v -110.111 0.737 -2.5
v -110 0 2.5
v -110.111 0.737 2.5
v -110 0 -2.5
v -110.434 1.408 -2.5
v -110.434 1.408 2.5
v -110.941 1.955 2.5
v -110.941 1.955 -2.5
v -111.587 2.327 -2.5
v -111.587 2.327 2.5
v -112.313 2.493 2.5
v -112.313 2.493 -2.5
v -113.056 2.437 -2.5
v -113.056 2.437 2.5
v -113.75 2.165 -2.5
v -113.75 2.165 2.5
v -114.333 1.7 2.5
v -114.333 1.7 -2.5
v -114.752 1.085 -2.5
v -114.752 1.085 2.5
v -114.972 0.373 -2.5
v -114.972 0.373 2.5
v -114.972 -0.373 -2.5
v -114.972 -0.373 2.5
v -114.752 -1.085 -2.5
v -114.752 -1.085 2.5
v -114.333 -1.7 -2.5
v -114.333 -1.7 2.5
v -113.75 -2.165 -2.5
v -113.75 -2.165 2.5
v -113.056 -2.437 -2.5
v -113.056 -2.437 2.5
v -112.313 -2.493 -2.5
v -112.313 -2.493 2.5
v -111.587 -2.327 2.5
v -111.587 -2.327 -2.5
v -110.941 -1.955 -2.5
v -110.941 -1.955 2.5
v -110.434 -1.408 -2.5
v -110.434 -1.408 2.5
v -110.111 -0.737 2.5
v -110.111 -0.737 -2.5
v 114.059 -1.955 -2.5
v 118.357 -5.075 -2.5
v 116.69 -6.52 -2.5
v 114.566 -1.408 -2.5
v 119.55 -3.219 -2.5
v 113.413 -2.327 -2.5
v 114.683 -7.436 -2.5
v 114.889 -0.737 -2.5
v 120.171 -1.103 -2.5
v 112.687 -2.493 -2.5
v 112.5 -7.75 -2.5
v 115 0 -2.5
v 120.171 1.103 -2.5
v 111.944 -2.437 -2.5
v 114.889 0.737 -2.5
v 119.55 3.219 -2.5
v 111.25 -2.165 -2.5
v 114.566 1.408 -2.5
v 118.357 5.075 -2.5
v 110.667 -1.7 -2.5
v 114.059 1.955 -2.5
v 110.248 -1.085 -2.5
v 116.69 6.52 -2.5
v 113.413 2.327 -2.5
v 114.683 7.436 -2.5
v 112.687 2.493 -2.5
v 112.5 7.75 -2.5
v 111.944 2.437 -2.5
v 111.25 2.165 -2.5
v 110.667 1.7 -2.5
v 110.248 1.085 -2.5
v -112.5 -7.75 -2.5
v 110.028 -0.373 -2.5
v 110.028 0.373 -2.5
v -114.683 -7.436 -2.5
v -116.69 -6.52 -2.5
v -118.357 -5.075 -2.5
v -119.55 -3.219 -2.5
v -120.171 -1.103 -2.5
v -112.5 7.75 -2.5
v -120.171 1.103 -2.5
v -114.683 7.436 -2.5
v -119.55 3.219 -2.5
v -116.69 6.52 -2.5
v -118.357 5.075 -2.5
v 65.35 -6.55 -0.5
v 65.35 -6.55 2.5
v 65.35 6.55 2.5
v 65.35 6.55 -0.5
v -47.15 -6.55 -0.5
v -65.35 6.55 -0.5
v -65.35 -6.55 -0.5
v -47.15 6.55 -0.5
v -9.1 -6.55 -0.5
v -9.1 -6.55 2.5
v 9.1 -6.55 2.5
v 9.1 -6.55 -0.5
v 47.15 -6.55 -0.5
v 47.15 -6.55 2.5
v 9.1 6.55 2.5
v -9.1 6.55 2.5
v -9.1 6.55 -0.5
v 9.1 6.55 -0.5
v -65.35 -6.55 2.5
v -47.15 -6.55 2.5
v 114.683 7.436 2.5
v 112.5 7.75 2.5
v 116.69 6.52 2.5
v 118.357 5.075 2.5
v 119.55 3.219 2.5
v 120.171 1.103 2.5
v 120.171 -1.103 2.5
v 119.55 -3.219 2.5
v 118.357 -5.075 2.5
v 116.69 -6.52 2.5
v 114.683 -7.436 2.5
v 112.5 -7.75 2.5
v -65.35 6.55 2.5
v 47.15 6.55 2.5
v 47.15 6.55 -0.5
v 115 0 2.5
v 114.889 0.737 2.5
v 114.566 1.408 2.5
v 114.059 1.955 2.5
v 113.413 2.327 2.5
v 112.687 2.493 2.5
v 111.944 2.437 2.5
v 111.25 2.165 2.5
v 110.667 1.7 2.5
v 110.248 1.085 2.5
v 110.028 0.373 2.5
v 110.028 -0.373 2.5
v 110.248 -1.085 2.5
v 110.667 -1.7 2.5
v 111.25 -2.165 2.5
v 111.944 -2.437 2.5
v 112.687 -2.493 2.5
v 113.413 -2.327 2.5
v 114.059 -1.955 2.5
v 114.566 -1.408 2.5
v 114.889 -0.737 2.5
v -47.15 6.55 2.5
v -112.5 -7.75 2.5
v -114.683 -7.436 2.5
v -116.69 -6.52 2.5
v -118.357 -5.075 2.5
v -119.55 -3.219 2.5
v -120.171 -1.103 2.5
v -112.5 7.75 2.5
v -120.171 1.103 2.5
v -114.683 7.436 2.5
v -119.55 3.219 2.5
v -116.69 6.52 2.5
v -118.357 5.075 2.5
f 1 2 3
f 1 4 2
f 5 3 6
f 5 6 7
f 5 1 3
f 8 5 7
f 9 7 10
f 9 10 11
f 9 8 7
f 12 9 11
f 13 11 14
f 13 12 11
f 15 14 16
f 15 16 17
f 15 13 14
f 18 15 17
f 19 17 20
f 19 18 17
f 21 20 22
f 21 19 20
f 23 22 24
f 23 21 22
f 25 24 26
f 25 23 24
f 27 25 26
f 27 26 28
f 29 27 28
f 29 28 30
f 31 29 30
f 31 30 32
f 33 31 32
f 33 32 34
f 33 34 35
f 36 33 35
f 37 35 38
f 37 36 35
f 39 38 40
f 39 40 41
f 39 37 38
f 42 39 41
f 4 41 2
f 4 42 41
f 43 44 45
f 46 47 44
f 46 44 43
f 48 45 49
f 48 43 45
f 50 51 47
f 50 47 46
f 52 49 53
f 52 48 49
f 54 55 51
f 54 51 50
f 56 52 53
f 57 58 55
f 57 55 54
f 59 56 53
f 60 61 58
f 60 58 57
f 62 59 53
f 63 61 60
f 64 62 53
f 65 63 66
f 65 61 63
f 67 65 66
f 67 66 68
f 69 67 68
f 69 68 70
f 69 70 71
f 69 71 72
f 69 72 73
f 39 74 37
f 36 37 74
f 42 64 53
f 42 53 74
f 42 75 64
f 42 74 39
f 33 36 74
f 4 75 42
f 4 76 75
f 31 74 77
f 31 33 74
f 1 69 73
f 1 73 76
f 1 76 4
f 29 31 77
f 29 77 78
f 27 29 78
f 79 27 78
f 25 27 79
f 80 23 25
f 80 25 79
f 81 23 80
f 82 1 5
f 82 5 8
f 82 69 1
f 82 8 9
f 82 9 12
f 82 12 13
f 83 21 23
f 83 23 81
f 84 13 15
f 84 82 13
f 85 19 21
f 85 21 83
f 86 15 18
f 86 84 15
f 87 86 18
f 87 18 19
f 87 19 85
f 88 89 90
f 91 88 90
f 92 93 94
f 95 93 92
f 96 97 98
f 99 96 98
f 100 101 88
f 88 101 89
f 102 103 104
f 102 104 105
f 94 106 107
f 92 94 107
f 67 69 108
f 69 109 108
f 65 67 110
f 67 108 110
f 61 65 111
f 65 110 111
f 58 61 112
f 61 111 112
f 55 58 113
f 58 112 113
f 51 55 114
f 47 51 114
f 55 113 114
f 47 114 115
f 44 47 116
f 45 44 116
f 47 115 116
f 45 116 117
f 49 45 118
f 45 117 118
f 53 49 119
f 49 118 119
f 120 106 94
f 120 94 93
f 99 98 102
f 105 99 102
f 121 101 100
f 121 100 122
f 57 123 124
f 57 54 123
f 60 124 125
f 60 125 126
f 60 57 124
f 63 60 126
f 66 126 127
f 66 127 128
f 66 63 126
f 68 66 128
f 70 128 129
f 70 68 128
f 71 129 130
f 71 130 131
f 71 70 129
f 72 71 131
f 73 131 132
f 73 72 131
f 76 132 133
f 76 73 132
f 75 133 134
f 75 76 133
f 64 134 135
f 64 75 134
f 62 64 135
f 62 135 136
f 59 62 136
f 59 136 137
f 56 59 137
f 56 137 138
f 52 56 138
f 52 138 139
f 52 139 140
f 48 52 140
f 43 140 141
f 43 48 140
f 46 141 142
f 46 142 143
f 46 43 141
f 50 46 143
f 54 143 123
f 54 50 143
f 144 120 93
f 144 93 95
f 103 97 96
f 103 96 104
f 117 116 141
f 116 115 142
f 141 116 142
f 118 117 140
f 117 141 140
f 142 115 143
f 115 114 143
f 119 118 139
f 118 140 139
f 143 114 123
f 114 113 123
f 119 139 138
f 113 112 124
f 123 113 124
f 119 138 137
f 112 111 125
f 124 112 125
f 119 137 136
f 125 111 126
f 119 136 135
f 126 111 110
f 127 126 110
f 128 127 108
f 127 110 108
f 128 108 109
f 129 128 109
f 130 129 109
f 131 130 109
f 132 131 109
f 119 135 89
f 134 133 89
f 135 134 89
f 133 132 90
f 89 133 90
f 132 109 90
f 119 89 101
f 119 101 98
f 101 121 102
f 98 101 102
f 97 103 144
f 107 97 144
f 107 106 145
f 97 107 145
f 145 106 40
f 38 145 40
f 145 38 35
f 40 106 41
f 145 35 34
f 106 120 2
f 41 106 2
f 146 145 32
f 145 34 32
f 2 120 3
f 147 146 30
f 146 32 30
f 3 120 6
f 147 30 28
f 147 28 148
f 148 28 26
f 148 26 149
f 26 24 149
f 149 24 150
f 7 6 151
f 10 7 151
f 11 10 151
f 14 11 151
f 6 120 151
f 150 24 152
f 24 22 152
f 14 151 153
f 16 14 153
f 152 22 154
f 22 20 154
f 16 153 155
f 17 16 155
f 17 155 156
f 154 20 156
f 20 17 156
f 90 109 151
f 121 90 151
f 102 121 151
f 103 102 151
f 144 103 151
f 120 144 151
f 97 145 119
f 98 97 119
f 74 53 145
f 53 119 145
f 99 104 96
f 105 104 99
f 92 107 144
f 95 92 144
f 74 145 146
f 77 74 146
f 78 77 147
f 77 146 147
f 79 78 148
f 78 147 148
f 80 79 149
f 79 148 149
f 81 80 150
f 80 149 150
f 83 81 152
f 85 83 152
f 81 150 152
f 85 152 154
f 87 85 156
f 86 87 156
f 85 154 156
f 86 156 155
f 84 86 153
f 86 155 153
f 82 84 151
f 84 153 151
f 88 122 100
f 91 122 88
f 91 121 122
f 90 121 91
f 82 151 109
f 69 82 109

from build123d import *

# Parameters (mm, degrees)
CROQUIS1_R              = 2.5
SALIENTE_EXTRUIR1_DEPTH = 2.5
CROQUIS4_W              = 18.2
CROQUIS4_H              = 13.1
CORTAR_EXTRUIR4_DEPTH   = 3


with BuildPart() as part:
    # Croquis1 → Saliente-Extruir1 (new, symmetric)
    with BuildSketch(Plane.XY):
        with BuildLine():
            Line((-112.5, 7.75), (112.5, 7.75))
            ThreePointArc((112.5, 7.75), (120.25, 0), (112.5, -7.75))
            Line((112.5, -7.75), (-112.5, -7.75))
            ThreePointArc((-112.5, -7.75), (-120.25, 0), (-112.5, 7.75))
        make_face()
        with Locations((112.5, 0)):
            Circle(CROQUIS1_R, mode=Mode.SUBTRACT)
        with Locations((-112.5, 0)):
            Circle(CROQUIS1_R, mode=Mode.SUBTRACT)
    extrude(amount=SALIENTE_EXTRUIR1_DEPTH, both=True)

    # Croquis4 → Cortar-Extruir4 (cut)
    with BuildSketch(Plane.XY.offset(2.5)):
        Rectangle(CROQUIS4_W, CROQUIS4_H)
        with Locations((-56.25, 0)):
            Rectangle(CROQUIS4_W, CROQUIS4_H)
        with Locations((56.25, 0)):
            Rectangle(CROQUIS4_W, CROQUIS4_H)
    extrude(amount=-CORTAR_EXTRUIR4_DEPTH, mode=Mode.SUBTRACT)


solid = part.part
